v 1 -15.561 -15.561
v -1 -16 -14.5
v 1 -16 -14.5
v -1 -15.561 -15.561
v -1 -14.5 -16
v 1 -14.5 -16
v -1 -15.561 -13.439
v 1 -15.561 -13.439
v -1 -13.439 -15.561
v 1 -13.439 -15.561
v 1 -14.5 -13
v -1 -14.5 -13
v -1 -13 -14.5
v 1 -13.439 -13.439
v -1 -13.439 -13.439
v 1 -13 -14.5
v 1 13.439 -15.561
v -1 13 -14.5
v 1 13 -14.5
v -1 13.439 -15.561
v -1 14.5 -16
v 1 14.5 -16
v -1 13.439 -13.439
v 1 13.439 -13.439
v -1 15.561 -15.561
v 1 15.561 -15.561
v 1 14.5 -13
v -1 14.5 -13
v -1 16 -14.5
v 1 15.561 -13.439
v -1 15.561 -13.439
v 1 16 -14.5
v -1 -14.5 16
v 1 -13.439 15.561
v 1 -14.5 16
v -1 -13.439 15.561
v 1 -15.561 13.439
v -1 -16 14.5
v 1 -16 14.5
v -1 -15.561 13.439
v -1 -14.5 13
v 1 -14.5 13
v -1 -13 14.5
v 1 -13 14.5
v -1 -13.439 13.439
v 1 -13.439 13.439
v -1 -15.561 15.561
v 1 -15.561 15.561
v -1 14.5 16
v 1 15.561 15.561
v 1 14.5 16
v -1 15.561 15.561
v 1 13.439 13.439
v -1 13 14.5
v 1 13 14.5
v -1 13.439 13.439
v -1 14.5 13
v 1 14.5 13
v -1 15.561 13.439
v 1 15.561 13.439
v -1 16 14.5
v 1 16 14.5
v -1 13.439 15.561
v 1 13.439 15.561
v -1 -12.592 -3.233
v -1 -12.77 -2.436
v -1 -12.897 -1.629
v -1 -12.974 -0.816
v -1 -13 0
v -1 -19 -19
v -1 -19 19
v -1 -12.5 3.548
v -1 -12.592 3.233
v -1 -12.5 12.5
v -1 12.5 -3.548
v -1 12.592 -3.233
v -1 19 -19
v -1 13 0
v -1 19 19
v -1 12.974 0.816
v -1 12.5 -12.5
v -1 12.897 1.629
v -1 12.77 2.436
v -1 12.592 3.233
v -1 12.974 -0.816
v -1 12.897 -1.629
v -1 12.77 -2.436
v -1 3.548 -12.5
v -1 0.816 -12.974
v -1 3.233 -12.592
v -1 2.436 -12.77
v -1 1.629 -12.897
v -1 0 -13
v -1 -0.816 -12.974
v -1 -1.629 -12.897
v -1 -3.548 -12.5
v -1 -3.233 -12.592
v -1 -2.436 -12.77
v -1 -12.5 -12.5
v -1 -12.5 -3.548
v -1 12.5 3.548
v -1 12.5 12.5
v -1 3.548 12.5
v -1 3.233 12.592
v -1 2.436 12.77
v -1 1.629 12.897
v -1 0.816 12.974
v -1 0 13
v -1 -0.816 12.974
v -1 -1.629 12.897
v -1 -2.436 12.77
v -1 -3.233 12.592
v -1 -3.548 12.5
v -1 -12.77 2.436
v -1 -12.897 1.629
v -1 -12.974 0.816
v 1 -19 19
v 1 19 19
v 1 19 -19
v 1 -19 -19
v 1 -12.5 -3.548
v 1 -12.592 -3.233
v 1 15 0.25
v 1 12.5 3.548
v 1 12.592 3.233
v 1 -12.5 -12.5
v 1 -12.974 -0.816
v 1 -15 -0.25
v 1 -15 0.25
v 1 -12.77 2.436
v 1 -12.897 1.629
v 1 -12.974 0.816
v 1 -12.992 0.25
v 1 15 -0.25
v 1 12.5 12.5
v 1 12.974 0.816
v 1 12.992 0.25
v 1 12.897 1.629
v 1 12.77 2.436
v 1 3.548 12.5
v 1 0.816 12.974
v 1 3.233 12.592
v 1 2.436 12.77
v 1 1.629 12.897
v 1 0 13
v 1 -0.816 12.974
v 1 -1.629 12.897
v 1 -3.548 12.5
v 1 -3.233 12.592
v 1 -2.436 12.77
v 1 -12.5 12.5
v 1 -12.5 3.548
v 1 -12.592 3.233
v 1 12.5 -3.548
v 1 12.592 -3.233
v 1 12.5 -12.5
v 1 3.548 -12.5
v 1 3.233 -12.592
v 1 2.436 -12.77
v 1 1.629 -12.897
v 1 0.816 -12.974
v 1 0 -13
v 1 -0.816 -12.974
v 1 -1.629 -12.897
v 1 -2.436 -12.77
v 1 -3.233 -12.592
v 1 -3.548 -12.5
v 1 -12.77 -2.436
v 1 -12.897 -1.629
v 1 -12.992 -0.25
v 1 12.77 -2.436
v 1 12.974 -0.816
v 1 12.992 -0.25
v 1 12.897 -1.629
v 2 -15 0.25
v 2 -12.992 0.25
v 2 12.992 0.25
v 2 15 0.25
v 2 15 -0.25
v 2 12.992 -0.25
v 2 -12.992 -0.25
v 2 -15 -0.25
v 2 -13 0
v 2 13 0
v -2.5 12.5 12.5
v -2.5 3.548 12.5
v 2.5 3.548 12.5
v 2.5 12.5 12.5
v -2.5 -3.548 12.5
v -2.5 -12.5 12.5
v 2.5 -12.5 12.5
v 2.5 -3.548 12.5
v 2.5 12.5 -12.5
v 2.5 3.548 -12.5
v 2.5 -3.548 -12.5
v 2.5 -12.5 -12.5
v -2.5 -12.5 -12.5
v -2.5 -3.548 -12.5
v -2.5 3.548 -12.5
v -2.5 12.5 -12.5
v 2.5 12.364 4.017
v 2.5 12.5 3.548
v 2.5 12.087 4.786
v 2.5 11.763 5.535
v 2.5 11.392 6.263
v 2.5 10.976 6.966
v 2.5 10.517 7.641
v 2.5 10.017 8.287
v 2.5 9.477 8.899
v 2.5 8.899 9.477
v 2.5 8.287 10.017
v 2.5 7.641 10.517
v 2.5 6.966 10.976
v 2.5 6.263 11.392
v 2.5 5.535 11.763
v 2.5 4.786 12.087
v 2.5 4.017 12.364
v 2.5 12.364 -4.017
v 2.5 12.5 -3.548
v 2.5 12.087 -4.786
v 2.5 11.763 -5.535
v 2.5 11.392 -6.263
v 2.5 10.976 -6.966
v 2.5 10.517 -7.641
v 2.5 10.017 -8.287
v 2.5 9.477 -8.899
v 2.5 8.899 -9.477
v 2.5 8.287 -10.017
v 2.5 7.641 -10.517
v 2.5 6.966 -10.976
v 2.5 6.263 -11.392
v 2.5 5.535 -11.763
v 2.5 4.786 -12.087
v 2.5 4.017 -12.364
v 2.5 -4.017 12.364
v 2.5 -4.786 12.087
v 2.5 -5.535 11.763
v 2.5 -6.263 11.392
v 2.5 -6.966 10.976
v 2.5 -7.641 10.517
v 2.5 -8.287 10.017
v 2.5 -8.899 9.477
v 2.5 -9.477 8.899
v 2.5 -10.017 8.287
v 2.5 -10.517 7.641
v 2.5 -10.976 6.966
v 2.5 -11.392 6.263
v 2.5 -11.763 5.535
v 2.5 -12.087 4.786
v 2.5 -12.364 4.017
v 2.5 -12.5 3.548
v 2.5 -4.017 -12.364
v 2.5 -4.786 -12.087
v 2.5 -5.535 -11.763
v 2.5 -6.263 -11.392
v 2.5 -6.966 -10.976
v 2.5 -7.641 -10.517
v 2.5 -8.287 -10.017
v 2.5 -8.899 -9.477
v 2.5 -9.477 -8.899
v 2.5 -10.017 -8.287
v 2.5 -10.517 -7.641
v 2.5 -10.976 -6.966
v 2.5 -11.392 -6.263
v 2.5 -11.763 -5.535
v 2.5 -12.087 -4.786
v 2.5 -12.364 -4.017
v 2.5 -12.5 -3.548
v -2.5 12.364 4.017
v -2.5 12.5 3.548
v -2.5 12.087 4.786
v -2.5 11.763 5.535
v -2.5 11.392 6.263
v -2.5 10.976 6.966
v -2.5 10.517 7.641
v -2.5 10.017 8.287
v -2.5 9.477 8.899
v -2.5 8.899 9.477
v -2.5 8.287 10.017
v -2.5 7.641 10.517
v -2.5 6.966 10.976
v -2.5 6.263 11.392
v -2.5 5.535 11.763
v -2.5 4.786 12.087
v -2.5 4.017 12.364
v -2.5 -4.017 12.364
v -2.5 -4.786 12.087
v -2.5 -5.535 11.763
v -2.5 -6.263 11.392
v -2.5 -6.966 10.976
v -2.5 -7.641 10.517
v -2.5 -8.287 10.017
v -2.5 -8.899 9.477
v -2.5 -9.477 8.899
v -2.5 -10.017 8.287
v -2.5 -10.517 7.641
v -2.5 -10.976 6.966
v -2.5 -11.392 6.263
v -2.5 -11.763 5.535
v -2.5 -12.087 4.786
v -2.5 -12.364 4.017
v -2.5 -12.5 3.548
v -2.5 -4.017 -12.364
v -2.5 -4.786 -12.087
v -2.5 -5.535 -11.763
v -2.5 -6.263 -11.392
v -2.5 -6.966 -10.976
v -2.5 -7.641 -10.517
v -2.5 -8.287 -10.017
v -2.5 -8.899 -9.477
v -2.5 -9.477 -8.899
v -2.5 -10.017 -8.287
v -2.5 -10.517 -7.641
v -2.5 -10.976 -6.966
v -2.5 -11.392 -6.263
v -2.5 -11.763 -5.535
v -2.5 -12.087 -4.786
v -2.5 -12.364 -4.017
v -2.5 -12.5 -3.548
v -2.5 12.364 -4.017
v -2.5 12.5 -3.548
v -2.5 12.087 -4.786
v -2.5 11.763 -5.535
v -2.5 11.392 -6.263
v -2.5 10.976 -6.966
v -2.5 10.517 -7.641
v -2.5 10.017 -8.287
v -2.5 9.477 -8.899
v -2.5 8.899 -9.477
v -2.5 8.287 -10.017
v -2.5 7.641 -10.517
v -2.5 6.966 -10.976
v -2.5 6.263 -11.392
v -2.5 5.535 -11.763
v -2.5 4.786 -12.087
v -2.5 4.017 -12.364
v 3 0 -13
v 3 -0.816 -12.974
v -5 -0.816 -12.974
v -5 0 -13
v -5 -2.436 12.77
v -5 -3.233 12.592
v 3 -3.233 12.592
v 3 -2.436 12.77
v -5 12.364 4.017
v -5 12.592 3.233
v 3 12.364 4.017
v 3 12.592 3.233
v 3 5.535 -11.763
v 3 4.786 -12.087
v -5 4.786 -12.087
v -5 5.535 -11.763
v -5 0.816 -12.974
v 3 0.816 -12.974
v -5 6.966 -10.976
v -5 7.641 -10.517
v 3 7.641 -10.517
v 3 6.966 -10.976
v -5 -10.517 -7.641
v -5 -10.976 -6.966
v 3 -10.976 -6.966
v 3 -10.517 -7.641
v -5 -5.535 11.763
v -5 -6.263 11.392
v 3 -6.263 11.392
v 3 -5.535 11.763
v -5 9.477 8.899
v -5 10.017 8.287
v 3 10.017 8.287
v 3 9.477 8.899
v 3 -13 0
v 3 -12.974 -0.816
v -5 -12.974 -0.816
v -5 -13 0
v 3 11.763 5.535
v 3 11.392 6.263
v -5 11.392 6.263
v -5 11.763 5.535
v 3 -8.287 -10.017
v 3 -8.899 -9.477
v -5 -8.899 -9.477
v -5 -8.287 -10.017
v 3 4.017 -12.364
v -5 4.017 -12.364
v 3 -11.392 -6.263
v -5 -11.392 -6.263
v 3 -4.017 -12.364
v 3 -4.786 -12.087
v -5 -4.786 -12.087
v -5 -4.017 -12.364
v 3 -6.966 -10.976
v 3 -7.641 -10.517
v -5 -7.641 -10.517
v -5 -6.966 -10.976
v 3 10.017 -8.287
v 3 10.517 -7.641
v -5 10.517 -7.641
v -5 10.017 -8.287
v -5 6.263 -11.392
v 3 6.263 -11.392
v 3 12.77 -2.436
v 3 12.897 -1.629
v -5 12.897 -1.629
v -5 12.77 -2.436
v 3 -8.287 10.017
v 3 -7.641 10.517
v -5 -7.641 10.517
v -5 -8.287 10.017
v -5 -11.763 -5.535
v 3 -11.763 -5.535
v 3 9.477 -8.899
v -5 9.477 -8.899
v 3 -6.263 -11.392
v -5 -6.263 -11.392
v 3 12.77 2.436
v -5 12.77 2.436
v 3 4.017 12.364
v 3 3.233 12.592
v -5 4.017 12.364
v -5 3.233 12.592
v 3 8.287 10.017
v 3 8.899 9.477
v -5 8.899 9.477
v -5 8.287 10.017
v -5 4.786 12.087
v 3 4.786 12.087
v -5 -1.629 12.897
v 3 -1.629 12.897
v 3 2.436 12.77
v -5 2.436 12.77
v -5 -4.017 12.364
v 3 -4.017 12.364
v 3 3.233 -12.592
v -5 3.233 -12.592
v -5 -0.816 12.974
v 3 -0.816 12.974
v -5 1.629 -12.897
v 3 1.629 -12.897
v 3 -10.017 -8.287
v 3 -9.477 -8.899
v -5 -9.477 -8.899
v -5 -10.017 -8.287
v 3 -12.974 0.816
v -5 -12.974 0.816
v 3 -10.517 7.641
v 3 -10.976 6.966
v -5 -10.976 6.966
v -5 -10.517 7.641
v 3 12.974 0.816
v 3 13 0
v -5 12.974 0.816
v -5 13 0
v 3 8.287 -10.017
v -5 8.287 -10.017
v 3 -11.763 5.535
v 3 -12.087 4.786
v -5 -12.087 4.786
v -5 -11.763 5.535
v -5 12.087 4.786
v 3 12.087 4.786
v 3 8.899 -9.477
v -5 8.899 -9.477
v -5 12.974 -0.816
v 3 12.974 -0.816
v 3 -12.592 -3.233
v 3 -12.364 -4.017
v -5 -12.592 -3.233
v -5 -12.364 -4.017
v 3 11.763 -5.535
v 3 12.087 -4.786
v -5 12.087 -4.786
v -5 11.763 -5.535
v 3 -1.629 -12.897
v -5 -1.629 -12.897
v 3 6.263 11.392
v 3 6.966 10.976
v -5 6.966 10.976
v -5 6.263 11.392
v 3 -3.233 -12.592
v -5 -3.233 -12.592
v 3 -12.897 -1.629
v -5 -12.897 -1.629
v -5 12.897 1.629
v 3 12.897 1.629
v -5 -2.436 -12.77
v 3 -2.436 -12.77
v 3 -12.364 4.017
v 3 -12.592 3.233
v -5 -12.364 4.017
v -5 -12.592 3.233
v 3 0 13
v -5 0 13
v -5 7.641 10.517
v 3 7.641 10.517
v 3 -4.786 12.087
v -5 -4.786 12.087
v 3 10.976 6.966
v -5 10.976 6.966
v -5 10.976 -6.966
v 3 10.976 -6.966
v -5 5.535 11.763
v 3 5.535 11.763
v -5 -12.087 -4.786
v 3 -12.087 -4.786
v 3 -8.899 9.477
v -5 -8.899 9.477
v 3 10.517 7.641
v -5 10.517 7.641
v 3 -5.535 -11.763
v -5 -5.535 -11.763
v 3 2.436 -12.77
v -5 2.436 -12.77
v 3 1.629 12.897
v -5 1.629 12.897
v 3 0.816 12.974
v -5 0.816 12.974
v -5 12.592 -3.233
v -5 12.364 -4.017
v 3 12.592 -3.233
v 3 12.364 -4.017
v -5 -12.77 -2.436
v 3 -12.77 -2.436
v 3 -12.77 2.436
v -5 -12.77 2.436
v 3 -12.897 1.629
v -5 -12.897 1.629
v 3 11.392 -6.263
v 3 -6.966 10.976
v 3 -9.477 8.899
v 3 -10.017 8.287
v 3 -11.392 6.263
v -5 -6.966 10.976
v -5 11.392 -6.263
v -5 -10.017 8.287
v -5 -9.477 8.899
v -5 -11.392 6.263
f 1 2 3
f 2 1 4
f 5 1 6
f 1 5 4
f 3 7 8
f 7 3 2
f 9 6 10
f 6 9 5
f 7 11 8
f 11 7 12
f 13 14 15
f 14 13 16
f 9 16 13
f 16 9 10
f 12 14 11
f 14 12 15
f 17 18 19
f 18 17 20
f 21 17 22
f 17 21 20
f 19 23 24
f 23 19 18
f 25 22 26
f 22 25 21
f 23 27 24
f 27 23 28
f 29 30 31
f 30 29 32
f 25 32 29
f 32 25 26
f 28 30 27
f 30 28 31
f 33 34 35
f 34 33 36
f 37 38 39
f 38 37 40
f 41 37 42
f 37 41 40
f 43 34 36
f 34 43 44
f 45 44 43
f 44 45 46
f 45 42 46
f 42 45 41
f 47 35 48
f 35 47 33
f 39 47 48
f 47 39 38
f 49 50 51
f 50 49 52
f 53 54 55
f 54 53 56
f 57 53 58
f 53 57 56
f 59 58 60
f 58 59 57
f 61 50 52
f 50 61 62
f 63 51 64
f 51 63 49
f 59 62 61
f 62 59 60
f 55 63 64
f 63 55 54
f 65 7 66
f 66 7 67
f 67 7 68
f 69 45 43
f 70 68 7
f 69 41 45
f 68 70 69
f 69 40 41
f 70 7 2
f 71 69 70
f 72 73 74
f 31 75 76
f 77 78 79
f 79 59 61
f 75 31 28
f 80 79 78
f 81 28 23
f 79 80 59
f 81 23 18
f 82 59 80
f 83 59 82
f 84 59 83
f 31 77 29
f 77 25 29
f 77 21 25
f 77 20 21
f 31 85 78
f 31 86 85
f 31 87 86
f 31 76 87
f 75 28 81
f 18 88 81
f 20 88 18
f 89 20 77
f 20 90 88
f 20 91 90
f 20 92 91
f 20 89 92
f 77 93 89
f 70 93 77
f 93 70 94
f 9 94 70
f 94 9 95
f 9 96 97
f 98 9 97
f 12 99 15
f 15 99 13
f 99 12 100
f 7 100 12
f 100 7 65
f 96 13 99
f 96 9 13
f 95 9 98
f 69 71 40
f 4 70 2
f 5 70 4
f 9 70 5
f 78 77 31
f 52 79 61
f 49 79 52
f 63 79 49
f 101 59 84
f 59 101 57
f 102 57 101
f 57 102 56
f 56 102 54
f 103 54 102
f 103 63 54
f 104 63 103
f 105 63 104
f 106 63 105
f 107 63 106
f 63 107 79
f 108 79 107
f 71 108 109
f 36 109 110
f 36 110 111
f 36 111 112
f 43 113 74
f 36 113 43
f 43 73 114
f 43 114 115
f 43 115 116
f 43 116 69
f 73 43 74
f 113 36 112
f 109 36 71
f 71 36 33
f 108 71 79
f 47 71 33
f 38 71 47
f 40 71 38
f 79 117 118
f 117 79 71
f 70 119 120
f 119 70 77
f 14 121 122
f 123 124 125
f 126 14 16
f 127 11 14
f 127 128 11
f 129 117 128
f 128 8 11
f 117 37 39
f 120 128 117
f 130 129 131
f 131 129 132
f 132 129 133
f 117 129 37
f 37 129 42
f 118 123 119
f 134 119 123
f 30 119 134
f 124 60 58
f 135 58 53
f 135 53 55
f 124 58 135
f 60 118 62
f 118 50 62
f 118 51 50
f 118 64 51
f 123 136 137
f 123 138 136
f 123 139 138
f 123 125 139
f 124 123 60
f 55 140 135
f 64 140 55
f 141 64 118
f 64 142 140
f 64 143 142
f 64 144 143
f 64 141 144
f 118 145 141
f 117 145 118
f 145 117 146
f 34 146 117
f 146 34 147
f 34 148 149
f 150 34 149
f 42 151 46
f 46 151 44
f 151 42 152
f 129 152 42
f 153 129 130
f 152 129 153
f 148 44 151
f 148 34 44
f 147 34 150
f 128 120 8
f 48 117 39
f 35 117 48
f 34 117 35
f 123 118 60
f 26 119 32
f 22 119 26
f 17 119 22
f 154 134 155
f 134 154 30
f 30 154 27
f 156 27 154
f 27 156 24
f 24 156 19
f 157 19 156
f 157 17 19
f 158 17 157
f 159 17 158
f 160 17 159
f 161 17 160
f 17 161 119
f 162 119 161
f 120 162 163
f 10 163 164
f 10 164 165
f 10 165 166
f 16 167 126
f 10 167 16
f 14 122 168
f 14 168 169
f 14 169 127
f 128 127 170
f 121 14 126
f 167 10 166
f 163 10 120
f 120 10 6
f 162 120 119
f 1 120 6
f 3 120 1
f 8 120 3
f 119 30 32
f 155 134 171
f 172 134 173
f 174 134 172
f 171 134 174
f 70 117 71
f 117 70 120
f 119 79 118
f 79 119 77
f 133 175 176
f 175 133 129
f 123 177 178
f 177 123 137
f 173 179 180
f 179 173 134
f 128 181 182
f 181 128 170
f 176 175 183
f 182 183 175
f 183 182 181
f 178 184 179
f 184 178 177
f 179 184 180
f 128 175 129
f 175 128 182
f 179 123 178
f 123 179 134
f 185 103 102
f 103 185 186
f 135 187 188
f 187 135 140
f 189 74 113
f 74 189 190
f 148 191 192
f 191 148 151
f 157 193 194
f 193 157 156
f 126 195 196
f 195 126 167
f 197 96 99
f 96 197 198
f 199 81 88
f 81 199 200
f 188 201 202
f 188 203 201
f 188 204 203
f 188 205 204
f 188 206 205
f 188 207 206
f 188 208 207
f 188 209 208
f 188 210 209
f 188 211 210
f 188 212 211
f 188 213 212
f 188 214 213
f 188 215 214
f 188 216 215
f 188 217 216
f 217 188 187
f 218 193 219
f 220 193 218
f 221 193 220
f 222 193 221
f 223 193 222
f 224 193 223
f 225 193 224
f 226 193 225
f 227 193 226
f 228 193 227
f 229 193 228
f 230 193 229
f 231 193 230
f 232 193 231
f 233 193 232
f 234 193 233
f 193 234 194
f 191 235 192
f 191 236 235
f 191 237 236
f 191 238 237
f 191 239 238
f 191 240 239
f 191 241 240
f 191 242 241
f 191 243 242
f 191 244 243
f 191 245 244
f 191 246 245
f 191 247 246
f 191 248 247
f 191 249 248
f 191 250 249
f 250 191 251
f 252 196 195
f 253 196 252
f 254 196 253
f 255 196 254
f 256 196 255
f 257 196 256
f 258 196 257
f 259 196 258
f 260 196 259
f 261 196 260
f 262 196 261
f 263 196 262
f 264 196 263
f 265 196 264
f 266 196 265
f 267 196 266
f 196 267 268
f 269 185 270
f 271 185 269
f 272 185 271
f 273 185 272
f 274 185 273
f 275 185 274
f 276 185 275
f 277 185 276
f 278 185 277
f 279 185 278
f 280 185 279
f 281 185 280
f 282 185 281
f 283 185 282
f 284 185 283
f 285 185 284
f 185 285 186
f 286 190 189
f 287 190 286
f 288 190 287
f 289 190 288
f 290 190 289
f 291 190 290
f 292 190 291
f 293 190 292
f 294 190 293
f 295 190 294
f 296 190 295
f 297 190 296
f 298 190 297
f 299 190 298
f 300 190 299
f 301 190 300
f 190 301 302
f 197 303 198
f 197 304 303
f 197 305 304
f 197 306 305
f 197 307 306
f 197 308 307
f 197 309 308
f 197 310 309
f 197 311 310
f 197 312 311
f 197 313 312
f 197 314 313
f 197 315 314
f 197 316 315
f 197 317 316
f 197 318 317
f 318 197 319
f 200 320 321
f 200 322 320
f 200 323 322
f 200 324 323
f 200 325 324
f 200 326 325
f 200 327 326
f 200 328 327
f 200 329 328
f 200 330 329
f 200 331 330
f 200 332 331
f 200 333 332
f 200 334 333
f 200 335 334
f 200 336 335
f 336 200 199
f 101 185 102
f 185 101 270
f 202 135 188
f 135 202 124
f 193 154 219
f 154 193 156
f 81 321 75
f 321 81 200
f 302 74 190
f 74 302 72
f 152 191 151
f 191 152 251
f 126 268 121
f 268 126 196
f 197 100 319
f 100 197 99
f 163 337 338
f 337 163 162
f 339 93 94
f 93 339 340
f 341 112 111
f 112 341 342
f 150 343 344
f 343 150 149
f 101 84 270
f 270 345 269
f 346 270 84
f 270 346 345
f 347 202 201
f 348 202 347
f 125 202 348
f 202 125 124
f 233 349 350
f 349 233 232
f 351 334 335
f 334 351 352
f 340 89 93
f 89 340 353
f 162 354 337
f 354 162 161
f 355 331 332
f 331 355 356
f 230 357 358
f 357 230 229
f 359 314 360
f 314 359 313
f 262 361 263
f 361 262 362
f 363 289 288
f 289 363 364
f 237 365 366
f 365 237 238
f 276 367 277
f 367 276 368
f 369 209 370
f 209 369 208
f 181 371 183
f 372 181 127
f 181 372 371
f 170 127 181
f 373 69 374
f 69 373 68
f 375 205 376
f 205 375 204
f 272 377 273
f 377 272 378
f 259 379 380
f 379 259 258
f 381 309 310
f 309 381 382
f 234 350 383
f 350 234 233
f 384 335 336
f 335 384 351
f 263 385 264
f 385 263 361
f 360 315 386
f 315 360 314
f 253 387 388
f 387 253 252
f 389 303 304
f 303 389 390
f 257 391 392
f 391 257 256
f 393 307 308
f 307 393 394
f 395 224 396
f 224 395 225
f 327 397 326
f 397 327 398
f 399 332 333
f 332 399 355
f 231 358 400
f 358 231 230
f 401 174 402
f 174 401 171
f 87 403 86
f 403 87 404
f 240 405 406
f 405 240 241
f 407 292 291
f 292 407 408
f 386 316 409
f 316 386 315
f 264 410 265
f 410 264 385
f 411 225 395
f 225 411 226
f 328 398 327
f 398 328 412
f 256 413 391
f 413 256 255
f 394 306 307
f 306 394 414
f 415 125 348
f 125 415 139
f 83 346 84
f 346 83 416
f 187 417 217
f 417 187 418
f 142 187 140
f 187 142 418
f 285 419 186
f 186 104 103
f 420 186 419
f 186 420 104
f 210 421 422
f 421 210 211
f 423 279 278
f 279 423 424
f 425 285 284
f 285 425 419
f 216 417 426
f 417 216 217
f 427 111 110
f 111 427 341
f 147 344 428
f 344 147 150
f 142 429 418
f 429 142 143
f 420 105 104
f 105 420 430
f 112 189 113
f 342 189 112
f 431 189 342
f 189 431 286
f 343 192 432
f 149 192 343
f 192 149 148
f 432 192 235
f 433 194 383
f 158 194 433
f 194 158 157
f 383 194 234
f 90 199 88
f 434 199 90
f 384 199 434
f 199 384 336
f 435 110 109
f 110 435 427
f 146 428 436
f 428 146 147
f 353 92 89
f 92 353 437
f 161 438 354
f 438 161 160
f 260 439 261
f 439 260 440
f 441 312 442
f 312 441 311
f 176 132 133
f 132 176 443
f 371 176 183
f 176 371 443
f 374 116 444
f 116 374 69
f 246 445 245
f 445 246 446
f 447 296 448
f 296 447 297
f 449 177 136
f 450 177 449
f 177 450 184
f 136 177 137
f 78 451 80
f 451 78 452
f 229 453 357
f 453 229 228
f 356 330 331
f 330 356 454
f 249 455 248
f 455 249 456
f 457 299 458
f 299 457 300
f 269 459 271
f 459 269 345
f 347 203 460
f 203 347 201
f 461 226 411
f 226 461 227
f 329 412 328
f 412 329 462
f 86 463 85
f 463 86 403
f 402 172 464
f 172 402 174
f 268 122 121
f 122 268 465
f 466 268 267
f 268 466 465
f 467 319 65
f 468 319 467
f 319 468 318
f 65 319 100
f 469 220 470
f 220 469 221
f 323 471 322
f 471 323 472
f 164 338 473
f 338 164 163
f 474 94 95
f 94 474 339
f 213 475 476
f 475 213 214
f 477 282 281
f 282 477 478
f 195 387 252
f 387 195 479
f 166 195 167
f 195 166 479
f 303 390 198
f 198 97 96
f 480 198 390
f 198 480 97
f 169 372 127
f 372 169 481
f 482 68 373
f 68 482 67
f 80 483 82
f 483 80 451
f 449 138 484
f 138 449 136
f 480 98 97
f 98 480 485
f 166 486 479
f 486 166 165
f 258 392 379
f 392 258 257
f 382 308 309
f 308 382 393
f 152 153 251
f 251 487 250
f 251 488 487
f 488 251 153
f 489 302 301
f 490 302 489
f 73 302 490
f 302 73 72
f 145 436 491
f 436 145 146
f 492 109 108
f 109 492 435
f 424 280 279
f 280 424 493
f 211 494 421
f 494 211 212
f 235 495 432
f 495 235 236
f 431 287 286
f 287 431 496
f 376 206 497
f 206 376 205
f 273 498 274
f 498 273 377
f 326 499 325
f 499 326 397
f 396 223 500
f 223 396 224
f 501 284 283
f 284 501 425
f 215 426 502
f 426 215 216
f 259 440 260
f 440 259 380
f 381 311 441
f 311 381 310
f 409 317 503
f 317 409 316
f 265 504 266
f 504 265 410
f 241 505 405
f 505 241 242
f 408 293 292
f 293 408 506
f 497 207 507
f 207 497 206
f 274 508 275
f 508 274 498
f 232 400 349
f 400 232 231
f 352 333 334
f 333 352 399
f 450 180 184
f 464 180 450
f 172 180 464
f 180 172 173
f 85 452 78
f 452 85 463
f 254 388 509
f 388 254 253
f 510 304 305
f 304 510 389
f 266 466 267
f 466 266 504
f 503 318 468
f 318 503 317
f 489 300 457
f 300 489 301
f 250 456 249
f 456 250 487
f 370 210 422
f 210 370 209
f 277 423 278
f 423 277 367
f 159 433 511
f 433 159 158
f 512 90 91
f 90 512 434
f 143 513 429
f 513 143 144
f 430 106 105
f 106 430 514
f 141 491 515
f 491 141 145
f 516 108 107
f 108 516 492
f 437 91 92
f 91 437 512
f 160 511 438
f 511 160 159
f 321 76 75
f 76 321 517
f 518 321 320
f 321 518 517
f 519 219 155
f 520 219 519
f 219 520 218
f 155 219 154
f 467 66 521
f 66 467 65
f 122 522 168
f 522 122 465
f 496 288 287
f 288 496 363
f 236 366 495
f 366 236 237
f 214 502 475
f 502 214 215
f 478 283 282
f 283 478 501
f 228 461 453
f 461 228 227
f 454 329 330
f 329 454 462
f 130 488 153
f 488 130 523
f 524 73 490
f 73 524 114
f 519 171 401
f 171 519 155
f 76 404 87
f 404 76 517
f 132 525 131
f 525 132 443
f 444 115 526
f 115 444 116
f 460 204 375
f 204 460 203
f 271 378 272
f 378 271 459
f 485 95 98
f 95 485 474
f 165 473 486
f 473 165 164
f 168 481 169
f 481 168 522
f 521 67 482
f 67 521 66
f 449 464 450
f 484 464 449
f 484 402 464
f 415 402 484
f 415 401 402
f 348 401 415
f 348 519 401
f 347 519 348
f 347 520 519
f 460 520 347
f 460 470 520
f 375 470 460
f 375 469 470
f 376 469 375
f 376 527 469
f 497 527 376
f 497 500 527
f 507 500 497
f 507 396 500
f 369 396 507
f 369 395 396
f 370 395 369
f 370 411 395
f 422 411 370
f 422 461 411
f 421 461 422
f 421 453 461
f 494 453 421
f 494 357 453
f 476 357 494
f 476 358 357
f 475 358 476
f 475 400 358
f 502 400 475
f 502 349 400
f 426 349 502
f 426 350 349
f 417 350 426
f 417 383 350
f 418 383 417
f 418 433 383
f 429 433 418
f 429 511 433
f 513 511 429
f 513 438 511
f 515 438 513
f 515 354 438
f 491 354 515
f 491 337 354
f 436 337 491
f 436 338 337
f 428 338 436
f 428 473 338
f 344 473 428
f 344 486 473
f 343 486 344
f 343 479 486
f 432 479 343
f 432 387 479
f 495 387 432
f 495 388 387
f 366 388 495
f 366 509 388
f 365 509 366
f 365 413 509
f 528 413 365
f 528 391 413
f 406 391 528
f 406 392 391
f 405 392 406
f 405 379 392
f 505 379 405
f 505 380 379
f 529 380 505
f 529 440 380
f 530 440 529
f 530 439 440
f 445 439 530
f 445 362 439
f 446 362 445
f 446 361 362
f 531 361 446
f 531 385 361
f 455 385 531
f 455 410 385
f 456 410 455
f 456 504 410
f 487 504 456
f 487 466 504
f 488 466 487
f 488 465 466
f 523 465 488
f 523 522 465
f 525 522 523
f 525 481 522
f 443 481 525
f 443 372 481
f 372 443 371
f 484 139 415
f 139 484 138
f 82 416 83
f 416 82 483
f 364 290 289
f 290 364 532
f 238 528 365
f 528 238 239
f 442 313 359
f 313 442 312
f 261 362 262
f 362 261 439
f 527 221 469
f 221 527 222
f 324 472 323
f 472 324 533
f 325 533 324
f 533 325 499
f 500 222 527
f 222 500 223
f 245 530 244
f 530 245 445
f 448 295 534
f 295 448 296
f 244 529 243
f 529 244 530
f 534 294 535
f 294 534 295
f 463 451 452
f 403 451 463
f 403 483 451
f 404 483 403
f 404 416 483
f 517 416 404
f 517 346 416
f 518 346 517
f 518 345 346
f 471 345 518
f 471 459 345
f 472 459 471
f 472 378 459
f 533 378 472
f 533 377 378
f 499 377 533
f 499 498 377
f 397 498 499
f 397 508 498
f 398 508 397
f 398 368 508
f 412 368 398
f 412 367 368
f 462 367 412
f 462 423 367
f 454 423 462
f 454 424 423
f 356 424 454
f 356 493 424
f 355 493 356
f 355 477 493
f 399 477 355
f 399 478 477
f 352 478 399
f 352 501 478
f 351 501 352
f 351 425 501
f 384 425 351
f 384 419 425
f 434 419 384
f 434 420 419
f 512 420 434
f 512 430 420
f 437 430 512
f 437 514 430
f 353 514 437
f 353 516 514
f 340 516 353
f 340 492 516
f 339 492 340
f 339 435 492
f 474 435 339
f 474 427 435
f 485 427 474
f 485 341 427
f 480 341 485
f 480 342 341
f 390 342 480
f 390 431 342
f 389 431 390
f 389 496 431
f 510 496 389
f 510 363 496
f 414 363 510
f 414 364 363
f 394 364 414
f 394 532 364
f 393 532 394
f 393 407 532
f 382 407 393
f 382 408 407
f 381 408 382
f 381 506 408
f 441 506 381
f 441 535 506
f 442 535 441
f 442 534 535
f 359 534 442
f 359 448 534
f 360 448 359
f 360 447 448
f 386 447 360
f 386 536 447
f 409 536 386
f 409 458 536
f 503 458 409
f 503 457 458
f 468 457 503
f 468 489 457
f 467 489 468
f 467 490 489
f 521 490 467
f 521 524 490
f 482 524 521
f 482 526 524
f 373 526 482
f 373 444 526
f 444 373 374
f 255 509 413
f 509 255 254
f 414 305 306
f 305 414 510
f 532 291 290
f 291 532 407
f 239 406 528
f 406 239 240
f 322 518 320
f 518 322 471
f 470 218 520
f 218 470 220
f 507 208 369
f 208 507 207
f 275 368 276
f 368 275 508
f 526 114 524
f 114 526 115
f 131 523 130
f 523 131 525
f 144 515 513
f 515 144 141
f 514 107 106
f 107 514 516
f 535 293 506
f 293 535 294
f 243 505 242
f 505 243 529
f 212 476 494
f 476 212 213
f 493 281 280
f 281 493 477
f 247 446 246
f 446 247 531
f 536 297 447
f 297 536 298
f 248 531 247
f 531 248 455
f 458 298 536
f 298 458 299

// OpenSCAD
// file: opticsMount_retainingBracket.scad
use <write.scad>

module retainingBracket(){
	difference(){	
		translate([0,0,0]) color([.7,.9,.2]) cube(size=[2,38,38],center=true);
		translate([0,0,0]) cube(size=[6,22,22],center=true);
		rotate([0,90,0]){
			translate([14.5,14.5,0]) cylinder(h=5,r=1.5,$fn=8,center=true);			
			translate([14.5,-14.5,0]) cylinder(h=5,r=1.5,$fn=8,center=true);			
			translate([-14.5,14.5,0]) cylinder(h=5,r=1.5,$fn=8,center=true);			
			translate([-14.5,-14.5,0]) cylinder(h=5,r=1.5,$fn=8,center=true);		
		}
	}
	rotate([90,0,-90]){
		translate([0,15,1]){
			write("Meridian",h=3,t=2,center=true);
		}
	}
	rotate([90,0,-90]){
		translate([0,-15,1]){
			write("Scientific",h=3,t=2,center=true);
		}
	}
	difference(){
		translate([-1,0,0]) cube(size=[2,30,.5],center=true);	
		translate([0,0,0]) cube(size=[6,22,22],center=true);
	}
	difference(){
		translate([-1,0,0]) cube(size=[2,.5,25],center=true);	
		translate([0,0,0]) cube(size=[6,22,22],center=true);
	}
}

retainingBracket();
// main file
use <opticsMount_retainingBracket.scad>

module mirrorAssembly_rear(){
	translate([0,0,0]){
		rotate([180,180,0]){
			retainingBracket();
		}
	}
	translate([0,0,0]){
			cube(size=[5,25,25],center=true);
		}
		translate([-1,0,0]){
			rotate([0,90,0]) color([.3,.7,.2]) cylinder(r=13,h=8,$fn=100,center=true);
		}
}

mirrorAssembly_rear();
